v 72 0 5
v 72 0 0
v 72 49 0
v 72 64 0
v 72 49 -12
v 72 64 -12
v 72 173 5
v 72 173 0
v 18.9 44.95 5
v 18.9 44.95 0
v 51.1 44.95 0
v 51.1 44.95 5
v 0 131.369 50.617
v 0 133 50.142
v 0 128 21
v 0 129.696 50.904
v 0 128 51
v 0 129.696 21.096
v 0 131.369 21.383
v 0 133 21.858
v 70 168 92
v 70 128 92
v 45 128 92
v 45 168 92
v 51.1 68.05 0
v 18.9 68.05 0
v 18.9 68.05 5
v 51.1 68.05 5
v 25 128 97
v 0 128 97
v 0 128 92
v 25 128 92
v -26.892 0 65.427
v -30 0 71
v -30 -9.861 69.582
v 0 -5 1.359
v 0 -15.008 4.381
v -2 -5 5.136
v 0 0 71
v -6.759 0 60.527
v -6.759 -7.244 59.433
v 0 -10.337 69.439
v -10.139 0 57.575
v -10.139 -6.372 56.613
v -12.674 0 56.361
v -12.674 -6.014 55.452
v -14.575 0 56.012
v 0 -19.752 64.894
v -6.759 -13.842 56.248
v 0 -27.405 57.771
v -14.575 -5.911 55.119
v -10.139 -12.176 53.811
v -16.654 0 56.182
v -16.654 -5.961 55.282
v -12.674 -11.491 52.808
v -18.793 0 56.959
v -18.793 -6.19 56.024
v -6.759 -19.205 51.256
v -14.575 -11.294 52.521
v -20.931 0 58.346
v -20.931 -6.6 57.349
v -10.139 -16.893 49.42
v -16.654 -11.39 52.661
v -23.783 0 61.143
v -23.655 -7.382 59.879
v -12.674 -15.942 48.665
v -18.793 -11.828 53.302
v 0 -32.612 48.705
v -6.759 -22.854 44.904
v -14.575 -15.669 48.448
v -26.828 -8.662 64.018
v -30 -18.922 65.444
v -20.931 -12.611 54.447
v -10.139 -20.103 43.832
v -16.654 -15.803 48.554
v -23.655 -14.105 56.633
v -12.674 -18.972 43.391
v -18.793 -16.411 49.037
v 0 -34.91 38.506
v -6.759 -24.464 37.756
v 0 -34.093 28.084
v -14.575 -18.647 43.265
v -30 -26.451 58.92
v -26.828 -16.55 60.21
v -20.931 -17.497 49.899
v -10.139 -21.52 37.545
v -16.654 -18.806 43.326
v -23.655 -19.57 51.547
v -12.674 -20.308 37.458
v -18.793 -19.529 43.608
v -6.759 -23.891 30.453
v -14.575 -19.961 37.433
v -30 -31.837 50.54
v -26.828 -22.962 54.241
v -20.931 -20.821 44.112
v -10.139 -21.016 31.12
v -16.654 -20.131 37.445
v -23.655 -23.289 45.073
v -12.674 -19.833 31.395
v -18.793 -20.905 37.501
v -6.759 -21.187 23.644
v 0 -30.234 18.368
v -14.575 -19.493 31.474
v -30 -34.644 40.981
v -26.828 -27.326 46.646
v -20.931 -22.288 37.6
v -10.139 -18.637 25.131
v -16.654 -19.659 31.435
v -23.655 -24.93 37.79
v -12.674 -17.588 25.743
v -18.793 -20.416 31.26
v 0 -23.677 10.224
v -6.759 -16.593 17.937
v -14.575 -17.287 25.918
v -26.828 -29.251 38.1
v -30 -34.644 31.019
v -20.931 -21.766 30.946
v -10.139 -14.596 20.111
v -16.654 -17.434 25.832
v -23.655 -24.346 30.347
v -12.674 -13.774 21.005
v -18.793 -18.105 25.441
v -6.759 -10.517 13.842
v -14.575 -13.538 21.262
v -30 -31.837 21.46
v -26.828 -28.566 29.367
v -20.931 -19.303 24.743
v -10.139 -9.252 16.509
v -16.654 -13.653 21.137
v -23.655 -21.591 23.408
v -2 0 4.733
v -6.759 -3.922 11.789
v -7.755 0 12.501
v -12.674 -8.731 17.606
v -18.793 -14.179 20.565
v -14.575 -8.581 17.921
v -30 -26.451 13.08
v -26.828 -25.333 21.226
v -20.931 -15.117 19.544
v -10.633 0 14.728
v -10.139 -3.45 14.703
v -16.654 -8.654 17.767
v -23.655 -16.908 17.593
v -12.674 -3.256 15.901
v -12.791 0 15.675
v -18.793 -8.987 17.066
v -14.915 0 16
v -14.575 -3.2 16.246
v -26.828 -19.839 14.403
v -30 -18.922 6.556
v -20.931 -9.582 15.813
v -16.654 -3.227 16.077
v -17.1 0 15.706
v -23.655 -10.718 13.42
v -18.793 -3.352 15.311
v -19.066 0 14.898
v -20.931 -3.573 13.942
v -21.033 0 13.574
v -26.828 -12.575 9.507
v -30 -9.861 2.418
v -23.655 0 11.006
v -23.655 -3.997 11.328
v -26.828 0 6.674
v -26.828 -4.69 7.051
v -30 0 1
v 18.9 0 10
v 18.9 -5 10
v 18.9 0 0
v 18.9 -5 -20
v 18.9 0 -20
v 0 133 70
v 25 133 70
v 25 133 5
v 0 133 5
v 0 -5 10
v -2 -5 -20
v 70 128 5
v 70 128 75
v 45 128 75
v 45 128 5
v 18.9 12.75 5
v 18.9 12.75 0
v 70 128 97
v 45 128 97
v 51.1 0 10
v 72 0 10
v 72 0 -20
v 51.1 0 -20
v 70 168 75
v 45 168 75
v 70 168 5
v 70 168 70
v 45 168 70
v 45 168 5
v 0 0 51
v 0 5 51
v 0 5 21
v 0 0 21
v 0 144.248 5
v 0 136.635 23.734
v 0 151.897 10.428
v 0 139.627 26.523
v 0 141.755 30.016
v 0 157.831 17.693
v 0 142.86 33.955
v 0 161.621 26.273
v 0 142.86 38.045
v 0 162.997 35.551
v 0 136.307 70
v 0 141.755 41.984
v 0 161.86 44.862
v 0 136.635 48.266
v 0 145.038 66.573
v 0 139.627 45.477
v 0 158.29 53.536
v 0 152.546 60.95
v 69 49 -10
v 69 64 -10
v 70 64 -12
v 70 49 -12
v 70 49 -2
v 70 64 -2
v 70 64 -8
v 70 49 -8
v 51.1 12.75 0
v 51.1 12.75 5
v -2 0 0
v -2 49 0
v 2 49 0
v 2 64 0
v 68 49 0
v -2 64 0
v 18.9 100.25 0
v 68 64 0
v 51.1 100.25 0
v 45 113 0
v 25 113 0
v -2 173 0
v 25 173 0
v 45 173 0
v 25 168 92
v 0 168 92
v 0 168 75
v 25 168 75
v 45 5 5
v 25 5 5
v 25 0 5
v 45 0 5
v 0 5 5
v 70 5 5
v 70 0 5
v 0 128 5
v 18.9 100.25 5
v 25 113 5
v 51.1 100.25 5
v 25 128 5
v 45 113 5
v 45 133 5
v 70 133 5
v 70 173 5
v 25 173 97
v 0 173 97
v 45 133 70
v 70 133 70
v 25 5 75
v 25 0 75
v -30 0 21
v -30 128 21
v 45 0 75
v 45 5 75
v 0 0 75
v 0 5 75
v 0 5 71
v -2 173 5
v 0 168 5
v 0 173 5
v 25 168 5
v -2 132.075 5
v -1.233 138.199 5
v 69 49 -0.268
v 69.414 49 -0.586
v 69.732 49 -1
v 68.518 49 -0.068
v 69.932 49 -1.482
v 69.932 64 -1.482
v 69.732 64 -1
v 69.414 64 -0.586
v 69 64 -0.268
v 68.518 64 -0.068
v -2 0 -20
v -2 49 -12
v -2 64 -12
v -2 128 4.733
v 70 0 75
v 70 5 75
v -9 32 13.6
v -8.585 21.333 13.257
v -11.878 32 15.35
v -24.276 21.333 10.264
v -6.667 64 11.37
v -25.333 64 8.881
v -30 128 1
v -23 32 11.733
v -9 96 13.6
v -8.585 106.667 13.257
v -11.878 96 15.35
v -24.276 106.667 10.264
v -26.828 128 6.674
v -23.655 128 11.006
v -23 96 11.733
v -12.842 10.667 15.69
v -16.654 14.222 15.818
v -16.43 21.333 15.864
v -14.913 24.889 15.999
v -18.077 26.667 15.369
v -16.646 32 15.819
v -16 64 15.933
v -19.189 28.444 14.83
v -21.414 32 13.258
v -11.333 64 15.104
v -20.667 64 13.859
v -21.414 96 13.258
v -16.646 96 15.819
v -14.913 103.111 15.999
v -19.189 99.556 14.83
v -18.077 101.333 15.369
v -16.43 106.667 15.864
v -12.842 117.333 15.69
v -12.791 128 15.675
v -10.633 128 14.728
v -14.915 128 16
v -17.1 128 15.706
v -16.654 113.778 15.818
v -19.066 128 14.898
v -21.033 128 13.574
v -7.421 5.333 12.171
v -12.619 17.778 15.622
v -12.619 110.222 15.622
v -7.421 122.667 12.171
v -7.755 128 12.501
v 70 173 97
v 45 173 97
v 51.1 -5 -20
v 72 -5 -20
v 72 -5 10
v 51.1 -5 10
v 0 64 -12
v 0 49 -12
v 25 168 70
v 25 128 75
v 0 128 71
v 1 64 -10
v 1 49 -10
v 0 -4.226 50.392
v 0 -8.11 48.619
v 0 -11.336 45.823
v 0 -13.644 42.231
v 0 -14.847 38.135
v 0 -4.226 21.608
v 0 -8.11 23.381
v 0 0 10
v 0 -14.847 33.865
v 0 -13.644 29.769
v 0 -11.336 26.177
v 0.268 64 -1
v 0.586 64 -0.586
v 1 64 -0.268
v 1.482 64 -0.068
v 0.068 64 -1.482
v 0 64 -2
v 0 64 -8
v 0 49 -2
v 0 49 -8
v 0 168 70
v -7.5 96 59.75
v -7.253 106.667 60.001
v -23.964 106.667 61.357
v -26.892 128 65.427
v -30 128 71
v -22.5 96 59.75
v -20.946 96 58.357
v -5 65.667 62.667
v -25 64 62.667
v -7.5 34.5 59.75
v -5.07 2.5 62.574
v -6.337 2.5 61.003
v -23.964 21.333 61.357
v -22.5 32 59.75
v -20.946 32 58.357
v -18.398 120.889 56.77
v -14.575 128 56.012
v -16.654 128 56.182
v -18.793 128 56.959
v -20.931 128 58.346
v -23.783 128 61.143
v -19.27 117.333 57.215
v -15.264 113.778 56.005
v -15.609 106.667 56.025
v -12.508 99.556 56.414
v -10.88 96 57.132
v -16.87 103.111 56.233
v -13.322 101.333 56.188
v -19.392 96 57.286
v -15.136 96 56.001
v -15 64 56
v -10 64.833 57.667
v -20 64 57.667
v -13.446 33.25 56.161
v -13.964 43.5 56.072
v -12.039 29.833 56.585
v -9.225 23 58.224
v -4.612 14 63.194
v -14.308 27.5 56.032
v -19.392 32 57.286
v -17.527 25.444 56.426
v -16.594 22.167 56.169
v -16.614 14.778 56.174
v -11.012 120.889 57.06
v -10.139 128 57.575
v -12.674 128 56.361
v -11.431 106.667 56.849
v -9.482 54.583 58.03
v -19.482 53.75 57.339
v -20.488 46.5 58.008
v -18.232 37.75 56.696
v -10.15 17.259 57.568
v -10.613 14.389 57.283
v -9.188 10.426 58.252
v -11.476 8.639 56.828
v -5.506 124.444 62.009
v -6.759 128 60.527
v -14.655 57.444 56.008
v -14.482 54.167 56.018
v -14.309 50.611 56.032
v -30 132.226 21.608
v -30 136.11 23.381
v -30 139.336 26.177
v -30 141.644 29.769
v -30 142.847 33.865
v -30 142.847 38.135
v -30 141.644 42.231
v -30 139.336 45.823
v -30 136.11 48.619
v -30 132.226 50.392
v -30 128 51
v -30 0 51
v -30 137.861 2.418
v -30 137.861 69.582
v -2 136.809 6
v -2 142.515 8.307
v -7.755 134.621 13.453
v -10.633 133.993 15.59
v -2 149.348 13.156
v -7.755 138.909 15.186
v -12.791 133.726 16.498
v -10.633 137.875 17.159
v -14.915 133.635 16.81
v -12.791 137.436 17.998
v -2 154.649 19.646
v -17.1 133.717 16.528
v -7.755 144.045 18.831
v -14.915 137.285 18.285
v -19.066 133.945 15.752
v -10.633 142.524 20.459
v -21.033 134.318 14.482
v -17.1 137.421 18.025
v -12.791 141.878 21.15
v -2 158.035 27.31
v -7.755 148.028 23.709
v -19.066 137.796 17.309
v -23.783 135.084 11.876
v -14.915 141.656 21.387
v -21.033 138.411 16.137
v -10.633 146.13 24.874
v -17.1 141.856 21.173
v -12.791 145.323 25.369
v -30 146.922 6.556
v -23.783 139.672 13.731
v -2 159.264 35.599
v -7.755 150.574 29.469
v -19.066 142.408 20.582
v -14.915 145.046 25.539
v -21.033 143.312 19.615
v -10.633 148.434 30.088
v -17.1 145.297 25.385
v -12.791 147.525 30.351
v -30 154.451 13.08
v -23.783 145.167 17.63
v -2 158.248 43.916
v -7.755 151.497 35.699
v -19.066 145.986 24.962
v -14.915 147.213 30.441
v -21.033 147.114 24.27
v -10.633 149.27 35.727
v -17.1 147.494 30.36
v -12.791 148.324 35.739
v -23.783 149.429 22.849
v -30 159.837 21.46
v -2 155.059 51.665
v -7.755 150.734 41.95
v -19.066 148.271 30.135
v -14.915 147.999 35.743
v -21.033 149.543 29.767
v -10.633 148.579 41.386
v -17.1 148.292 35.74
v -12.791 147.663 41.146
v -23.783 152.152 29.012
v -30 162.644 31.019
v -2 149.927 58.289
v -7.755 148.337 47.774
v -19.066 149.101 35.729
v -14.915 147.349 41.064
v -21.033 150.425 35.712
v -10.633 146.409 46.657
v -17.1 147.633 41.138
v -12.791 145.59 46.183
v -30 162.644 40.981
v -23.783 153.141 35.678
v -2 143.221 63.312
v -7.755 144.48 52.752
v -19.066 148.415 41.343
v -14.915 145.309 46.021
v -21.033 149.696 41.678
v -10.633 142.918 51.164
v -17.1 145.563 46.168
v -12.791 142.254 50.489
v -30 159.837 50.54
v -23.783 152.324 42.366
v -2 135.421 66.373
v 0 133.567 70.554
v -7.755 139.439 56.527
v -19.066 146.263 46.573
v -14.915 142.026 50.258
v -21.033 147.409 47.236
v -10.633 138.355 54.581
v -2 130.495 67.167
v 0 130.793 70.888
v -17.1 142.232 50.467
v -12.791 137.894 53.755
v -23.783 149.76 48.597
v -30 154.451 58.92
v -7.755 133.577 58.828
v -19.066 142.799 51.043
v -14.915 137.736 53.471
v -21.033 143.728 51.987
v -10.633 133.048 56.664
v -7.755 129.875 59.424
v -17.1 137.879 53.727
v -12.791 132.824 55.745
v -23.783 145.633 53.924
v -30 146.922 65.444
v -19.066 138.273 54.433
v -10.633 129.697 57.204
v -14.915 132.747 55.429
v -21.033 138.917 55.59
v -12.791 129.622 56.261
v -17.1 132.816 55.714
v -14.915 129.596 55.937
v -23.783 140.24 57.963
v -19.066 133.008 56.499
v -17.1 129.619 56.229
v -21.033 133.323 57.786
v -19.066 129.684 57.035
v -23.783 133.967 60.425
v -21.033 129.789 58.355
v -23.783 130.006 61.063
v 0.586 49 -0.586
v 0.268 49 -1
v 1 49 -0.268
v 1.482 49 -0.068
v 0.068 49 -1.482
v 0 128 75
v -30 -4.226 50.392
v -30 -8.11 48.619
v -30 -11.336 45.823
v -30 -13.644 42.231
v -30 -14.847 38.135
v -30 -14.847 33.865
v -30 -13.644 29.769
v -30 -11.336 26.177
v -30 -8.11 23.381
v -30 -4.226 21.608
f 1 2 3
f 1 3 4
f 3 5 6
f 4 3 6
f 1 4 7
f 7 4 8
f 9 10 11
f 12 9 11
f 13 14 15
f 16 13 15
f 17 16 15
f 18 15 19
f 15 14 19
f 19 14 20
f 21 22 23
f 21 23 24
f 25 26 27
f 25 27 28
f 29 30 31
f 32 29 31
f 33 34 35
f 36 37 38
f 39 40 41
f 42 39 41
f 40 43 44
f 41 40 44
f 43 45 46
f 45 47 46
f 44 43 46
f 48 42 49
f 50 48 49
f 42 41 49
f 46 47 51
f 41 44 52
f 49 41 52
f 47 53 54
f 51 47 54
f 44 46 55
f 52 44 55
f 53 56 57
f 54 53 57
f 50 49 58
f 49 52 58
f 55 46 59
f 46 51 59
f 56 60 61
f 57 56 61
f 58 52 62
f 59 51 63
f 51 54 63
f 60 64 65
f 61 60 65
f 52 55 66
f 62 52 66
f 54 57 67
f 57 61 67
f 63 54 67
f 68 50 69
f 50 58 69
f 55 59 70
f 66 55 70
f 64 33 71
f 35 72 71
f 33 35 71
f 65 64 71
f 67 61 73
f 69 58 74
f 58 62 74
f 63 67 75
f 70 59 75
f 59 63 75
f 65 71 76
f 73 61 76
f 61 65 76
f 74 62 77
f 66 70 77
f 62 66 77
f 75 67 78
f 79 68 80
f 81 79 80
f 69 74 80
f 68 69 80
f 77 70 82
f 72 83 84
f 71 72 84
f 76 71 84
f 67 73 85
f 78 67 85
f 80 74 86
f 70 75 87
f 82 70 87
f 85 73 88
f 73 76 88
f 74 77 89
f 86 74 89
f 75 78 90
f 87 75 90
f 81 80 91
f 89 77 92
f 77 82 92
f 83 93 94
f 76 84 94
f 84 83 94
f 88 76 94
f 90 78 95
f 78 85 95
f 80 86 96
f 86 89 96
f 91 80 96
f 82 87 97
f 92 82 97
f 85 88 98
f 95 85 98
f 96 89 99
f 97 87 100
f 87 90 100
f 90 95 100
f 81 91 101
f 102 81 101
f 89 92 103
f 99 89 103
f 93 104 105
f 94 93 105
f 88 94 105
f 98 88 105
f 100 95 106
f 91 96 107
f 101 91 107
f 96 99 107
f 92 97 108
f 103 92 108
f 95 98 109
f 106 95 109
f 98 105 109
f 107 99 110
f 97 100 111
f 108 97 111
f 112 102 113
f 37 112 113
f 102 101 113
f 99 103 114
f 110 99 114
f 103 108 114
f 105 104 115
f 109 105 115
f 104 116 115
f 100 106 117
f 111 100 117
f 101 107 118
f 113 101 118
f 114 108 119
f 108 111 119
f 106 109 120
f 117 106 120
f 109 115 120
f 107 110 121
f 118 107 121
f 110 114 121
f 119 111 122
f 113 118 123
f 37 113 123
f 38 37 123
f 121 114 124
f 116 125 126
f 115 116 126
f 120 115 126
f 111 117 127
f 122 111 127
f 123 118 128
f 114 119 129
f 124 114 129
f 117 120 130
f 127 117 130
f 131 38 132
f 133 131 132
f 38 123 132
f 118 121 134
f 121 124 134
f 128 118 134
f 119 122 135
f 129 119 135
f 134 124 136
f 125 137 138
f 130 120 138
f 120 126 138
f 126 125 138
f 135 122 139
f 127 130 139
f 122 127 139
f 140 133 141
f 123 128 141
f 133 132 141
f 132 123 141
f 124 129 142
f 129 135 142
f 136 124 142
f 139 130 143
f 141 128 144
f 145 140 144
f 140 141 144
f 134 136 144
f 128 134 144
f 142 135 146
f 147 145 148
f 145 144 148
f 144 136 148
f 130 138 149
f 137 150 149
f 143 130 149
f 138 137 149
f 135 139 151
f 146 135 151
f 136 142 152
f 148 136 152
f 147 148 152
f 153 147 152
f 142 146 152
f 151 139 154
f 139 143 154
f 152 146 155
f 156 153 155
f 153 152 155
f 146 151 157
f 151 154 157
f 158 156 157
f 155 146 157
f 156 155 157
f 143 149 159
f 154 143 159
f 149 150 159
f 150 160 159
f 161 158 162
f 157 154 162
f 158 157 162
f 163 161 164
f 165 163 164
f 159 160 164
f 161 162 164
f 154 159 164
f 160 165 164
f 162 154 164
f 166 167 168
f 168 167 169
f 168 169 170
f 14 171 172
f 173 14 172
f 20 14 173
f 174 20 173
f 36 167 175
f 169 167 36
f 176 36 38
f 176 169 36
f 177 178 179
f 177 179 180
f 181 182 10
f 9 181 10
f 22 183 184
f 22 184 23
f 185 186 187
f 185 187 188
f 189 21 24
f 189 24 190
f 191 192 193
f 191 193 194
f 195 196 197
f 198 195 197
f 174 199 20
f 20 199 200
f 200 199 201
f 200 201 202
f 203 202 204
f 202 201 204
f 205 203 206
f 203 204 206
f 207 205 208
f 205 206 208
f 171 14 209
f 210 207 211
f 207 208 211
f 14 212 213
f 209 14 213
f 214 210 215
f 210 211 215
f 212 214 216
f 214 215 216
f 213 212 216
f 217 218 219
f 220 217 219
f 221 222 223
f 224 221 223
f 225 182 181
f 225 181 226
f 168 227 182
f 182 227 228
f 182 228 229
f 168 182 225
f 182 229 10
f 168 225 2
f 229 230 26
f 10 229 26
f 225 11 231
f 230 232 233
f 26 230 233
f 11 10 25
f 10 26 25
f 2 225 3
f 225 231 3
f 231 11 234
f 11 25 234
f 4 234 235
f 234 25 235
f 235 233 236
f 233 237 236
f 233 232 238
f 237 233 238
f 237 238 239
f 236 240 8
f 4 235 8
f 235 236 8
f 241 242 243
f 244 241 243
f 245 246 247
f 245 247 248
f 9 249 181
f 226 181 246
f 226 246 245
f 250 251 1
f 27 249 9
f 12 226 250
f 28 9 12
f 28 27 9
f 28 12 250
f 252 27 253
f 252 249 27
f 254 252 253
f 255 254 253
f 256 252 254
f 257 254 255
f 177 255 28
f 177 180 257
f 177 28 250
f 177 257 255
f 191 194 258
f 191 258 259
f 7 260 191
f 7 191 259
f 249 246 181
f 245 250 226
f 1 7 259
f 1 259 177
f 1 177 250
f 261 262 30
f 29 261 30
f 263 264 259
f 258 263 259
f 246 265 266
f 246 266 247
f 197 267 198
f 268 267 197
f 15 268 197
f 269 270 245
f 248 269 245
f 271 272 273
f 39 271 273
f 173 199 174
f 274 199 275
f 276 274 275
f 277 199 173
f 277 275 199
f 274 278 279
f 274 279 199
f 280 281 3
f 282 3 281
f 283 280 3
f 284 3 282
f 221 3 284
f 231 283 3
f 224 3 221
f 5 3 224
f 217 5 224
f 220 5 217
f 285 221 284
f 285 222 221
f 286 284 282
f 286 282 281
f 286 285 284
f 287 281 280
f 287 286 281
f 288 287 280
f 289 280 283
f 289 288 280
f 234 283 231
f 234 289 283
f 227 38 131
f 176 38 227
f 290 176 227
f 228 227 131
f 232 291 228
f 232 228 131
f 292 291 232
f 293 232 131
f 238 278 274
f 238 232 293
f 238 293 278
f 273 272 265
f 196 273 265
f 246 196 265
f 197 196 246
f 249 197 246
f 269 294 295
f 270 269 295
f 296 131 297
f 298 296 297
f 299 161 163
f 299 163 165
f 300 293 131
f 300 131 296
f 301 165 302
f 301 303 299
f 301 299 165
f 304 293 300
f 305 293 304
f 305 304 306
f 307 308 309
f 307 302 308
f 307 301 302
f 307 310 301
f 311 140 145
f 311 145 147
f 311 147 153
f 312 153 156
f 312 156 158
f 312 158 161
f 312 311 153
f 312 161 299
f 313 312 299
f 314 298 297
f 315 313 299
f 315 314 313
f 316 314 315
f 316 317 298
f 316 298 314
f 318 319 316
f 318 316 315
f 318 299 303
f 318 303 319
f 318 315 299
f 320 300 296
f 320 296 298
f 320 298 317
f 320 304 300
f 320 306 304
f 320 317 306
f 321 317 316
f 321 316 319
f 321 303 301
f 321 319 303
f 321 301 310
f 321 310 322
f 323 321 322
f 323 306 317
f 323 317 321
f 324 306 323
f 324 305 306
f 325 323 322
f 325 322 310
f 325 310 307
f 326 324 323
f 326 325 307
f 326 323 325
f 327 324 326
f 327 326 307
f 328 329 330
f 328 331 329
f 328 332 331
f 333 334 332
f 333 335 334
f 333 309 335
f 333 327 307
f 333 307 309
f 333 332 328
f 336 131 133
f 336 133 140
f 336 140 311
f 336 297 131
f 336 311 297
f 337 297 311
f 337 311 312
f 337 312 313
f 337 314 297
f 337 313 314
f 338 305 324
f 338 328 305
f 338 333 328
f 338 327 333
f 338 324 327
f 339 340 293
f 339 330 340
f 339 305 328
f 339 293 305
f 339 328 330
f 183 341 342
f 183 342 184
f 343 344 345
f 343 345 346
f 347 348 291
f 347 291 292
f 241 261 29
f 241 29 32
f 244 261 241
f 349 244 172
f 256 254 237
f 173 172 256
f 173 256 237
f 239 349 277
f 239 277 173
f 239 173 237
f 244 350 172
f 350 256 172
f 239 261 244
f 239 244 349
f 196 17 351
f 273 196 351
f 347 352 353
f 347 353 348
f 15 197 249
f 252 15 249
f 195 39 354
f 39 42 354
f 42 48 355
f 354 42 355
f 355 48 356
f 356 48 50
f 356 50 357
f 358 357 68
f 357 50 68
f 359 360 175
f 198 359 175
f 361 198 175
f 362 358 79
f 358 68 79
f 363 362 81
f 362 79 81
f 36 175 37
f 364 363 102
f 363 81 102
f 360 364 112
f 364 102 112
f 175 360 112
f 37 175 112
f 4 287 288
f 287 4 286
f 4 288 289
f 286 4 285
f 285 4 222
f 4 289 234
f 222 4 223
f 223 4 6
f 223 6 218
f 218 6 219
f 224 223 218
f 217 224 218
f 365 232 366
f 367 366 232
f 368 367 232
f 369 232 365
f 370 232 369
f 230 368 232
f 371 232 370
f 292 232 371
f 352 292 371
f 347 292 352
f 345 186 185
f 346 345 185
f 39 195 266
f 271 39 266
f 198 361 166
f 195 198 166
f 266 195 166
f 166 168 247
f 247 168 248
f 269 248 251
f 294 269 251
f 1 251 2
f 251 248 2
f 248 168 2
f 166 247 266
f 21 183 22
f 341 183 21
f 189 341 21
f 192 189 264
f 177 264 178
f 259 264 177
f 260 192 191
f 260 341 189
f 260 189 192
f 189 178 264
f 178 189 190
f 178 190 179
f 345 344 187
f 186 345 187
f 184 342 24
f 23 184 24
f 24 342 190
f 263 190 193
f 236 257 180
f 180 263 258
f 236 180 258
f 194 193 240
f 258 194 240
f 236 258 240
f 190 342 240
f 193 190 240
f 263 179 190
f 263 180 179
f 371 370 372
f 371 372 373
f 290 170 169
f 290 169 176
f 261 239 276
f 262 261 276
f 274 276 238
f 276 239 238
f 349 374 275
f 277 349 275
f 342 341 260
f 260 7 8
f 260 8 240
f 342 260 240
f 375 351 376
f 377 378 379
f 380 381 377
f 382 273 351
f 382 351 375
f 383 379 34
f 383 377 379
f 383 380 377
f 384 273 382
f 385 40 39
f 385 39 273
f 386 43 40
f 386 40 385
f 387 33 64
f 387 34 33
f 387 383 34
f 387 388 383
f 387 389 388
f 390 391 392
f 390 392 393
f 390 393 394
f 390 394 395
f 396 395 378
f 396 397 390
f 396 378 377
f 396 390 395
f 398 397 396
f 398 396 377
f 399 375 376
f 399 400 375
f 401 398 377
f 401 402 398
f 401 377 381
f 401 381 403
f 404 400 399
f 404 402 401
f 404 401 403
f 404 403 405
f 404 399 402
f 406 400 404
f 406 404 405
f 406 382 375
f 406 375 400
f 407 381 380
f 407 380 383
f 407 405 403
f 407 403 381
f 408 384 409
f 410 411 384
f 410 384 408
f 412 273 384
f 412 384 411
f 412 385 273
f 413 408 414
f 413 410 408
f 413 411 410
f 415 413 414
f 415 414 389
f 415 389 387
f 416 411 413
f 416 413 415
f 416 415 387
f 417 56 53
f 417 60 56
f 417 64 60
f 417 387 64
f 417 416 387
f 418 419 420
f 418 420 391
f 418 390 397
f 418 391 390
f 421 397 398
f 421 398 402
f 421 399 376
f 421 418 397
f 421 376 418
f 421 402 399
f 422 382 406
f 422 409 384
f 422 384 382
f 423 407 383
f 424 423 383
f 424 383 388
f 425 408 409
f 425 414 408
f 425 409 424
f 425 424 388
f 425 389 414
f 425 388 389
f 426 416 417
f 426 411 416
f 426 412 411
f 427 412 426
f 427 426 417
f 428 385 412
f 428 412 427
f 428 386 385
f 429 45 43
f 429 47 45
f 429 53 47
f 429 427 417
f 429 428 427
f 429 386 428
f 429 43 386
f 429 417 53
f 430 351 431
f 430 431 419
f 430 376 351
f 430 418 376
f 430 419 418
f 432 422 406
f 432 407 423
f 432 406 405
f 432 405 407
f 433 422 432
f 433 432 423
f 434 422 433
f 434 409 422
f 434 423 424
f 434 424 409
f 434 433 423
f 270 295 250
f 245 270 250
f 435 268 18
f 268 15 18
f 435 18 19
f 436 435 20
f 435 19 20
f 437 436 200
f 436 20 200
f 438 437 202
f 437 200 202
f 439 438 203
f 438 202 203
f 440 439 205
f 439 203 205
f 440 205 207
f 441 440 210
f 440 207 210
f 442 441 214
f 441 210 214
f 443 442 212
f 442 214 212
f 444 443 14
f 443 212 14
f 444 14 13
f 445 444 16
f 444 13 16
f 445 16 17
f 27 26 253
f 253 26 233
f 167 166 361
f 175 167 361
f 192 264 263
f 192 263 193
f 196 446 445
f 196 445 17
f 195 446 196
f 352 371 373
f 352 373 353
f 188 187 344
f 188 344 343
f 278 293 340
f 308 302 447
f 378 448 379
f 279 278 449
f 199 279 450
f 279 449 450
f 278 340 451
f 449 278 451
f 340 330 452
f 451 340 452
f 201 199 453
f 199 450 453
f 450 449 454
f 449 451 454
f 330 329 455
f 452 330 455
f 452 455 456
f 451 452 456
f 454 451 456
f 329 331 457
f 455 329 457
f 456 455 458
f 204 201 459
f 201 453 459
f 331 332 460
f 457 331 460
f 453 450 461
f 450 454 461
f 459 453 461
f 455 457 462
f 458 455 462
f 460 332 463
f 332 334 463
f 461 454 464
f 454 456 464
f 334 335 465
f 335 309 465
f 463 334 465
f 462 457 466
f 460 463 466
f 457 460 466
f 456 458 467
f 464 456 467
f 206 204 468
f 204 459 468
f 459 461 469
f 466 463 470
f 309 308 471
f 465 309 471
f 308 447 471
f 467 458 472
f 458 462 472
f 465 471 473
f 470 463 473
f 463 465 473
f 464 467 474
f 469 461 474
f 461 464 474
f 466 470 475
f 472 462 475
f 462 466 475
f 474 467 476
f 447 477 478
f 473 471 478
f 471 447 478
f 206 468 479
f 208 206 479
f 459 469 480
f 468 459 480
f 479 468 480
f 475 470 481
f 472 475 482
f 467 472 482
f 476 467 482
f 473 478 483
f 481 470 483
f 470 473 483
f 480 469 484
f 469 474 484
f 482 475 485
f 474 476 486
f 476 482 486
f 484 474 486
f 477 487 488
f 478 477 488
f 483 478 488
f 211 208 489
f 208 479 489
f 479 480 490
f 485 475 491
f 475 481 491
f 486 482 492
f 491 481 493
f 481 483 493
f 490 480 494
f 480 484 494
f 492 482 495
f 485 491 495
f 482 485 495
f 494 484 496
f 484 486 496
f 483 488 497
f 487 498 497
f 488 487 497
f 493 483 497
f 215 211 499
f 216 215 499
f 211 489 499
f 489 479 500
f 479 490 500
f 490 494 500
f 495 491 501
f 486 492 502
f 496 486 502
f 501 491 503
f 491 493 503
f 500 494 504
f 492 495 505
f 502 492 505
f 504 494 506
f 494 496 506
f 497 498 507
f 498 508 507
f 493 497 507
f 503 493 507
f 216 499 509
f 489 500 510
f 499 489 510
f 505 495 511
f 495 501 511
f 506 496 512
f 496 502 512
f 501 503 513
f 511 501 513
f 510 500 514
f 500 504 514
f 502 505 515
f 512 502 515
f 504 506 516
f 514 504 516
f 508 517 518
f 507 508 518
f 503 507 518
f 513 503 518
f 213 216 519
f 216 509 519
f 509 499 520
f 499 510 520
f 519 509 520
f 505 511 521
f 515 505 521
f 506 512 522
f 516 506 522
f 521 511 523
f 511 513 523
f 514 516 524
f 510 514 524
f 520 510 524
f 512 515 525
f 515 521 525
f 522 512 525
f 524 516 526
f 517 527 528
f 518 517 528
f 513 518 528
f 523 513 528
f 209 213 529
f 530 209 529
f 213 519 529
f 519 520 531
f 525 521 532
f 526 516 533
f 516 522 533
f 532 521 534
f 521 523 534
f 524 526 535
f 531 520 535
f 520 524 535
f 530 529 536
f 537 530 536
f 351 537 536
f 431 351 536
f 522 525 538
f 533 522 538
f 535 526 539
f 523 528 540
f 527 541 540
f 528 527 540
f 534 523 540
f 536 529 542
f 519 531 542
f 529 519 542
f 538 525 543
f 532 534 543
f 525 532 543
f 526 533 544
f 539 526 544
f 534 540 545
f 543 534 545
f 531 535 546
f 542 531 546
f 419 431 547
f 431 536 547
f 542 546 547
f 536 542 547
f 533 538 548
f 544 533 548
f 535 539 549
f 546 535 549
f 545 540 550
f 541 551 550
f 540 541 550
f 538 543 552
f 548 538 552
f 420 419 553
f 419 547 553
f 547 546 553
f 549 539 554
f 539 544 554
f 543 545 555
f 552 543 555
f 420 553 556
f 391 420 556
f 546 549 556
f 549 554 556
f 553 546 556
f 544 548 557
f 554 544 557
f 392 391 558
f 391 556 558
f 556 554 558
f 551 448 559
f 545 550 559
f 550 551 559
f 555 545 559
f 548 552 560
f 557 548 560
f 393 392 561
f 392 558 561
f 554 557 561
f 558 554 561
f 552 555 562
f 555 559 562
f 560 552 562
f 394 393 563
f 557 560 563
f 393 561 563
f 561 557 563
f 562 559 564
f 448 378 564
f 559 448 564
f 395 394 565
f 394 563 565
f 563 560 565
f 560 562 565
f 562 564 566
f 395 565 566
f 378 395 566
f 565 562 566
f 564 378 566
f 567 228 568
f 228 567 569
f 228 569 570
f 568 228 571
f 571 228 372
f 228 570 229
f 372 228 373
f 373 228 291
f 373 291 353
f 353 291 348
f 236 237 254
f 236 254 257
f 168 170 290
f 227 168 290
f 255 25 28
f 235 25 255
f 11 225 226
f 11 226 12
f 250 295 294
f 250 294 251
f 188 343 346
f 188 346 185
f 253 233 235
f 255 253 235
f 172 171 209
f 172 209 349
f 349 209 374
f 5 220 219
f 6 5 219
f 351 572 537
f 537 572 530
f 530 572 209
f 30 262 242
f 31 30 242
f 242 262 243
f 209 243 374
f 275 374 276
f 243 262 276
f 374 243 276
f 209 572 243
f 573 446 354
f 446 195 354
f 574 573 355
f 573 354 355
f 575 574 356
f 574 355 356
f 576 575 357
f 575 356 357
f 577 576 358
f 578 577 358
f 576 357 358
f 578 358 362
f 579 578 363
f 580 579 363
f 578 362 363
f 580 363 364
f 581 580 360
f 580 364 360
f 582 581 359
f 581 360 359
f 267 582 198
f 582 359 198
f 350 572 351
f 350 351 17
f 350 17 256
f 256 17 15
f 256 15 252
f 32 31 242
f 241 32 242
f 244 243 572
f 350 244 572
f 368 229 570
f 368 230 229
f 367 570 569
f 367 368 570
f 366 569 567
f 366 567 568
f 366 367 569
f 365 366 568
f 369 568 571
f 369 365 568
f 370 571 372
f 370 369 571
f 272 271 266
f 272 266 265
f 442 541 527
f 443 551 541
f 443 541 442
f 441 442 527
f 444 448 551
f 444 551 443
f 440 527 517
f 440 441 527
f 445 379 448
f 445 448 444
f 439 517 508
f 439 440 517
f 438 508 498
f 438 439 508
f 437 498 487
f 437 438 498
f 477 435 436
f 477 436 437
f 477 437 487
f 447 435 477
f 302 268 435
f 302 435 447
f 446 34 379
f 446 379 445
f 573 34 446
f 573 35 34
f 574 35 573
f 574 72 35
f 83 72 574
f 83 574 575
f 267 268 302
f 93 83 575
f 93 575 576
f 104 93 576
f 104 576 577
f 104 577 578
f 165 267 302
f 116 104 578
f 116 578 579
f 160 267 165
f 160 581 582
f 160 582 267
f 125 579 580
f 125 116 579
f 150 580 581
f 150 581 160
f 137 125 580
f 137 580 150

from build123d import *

# Parameters (mm, degrees)
SKETCH1_W                  = 25
SKETCH1_H                  = 60
SKETCH1_W_2                = 70
SKETCH1_H_2                = 113
SKETCH1_W_3                = 32.2
SKETCH1_H_3                = 32.2
BOSS_EXTRUDE1_DEPTH        = 5
SKETCH2_W                  = 65
SKETCH2_H                  = 5
SKETCH2_W_2                = 5
SKETCH2_H_2                = 40
SKETCH2_W_3                = 92
SKETCH2_W_4                = 70
BOSS_EXTRUDE2_DEPTH        = 25
SKETCH3_W                  = 12
SKETCH3_H                  = 15
BOSS_EXTRUDE3_DEPTH        = 2
BOSS_EXTRUDE5_DEPTH        = 15
SKETCH5_W                  = 20.9
SKETCH5_H                  = 5
BOSS_EXTRUDE6_DEPTH        = 20
BOSS_EXTRUDE6_DEPTH_BACK   = 10
BOSS_EXTRUDE6_2_DEPTH      = 20
BOSS_EXTRUDE6_2_DEPTH_BACK = 10
FILLET1_R                  = 2


with BuildPart() as part:
    # Sketch1 → Boss-Extrude1 (new body)
    with BuildSketch(Plane.XY):
        with Locations((12.5, 143)):
            Rectangle(SKETCH1_W, SKETCH1_H)
        with Locations((57.5, 143)):
            Rectangle(SKETCH1_W, SKETCH1_H)
        with Locations((35, 56.5)):
            Rectangle(SKETCH1_W_2, SKETCH1_H_2)
        with Locations((35, 28.85)):
            Rectangle(SKETCH1_W_3, SKETCH1_H_3, mode=Mode.SUBTRACT)
        with Locations((35, 84.15)):
            Rectangle(SKETCH1_W_3, SKETCH1_H_3, mode=Mode.SUBTRACT)
        Polygon((0, 173), (-2, 173), (-2, 0), (0, 0), (0, 113), align=None)
        Polygon((70, 0), (72, 0), (72, 173), (70, 173), (70, 113), align=None)
    extrude(amount=BOSS_EXTRUDE1_DEPTH)

    # Sketch2 → Boss-Extrude2 (add)
    with BuildSketch(Plane(origin=(0, 0, 0), x_dir=(0, 0, -1), z_dir=(1, 0, 0))):
        with Locations((-37.5, 130.5)):
            Rectangle(SKETCH2_W, SKETCH2_H)
        Polygon((-70, 133), (-70, 168), (-75, 168), (-75, 128), (-70, 128), align=None)
        with Locations((-94.5, 148)):
            Rectangle(SKETCH2_W_2, SKETCH2_H_2)
        with Locations((-51, 170.5)):
            Rectangle(SKETCH2_W_3, SKETCH2_H)
        with Locations((-40, 2.5)):
            Rectangle(SKETCH2_W_4, SKETCH2_H)
    boss_extrude2 = extrude(amount=BOSS_EXTRUDE2_DEPTH)

    # Mirror2: Boss-Extrude2 across plane
    add(boss_extrude2.mirror(Plane(origin=(35, 0, 0), x_dir=(0, 0, 1), z_dir=(1, 0, 0))))

    # Sketch3 → Boss-Extrude3 (add, through all)
    with BuildSketch(Plane(origin=(0, 0, 0), x_dir=(0, 0, -1), z_dir=(1, 0, 0))):
        with Locations((6, 56.5)):
            Rectangle(SKETCH3_W, SKETCH3_H)
    boss_extrude3 = extrude(amount=-BOSS_EXTRUDE3_DEPTH)

    # Sketch4 → Boss-Extrude5 (add)
    with BuildSketch(Plane(origin=(0, 64, 0), x_dir=(1, 0, 0), z_dir=(0, 1, 0))):
        Polygon((1, 10), (0, 12), (0, 10), align=None)
        Polygon((0, 8), (1, 10), (0, 10), align=None)
    boss_extrude5 = extrude(amount=-BOSS_EXTRUDE5_DEPTH)

    # Mirror3: Boss-Extrude3, Boss-Extrude5 across plane
    add(boss_extrude3.mirror(Plane(origin=(35, 0, 0), x_dir=(0, 0, 1), z_dir=(1, 0, 0))))
    add(boss_extrude5.mirror(Plane(origin=(35, 0, 0), x_dir=(0, 0, 1), z_dir=(1, 0, 0))))

    # Fillet1
    fillet1_edges = [part.edges().sort_by_distance(p)[0] for p in [
        (0, 56.5, 0),
        (70, 56.5, 0),
    ]]
    fillet(fillet1_edges, radius=FILLET1_R)



with BuildPart() as body_2:
    # Sketch5 → Boss-Extrude6 (new body, two sides)
    with BuildSketch(Plane(origin=(0, 0, 0), x_dir=(-1, 0, 0), z_dir=(0, 0, -1))) as boss_extrude6_sk:
        with Locations((-61.55, -2.5)):
            Rectangle(SKETCH5_W, SKETCH5_H)
    extrude(amount=BOSS_EXTRUDE6_DEPTH)
    extrude(boss_extrude6_sk.sketch, amount=-BOSS_EXTRUDE6_DEPTH_BACK)


with BuildPart() as body_3:
    # Sketch5 → Boss-Extrude6 2 (new body, two sides)
    with BuildSketch(Plane(origin=(0, 0, 0), x_dir=(-1, 0, 0), z_dir=(0, 0, -1))) as boss_extrude6_2_sk:
        with Locations((-8.45, -2.5)):
            Rectangle(SKETCH5_W, SKETCH5_H)
    extrude(amount=BOSS_EXTRUDE6_2_DEPTH)
    extrude(boss_extrude6_2_sk.sketch, amount=-BOSS_EXTRUDE6_2_DEPTH_BACK)


with BuildPart() as part_1:
    add(part.part)

    add(body_3.part)  # Sweep5 merges body 3
    # Sweep5: sweep along a path in Sketch7
    with BuildLine(Plane.ZY) as sweep5_path:
        Line((51, 128), (51, 0))
        ThreePointArc((51, 0), (36, -15), (21, 0))
        Line((21, 0), (21, 128))
        ThreePointArc((21, 128), (36, 143), (51, 128))
    # Sketch8 → Sweep5 (sweep)
    with BuildSketch(Plane(origin=(0, 50, 0), x_dir=(1, 0, 0), z_dir=(0, 1, 0))):
        with BuildLine():
            Line((0, -21), (-30, -21))
            Line((-30, -21), (-30, -1))
            add(Edge.make_bspline(
                [(-30, -1), (-15, -31), (0, -1)],
                knots=[0, 0, 0, 1, 1, 1], degree=2))
            Line((0, -1), (0, -21))
        make_face()
    sweep(path=sweep5_path.line)


solid = Compound([body_2.part, part_1.part])
